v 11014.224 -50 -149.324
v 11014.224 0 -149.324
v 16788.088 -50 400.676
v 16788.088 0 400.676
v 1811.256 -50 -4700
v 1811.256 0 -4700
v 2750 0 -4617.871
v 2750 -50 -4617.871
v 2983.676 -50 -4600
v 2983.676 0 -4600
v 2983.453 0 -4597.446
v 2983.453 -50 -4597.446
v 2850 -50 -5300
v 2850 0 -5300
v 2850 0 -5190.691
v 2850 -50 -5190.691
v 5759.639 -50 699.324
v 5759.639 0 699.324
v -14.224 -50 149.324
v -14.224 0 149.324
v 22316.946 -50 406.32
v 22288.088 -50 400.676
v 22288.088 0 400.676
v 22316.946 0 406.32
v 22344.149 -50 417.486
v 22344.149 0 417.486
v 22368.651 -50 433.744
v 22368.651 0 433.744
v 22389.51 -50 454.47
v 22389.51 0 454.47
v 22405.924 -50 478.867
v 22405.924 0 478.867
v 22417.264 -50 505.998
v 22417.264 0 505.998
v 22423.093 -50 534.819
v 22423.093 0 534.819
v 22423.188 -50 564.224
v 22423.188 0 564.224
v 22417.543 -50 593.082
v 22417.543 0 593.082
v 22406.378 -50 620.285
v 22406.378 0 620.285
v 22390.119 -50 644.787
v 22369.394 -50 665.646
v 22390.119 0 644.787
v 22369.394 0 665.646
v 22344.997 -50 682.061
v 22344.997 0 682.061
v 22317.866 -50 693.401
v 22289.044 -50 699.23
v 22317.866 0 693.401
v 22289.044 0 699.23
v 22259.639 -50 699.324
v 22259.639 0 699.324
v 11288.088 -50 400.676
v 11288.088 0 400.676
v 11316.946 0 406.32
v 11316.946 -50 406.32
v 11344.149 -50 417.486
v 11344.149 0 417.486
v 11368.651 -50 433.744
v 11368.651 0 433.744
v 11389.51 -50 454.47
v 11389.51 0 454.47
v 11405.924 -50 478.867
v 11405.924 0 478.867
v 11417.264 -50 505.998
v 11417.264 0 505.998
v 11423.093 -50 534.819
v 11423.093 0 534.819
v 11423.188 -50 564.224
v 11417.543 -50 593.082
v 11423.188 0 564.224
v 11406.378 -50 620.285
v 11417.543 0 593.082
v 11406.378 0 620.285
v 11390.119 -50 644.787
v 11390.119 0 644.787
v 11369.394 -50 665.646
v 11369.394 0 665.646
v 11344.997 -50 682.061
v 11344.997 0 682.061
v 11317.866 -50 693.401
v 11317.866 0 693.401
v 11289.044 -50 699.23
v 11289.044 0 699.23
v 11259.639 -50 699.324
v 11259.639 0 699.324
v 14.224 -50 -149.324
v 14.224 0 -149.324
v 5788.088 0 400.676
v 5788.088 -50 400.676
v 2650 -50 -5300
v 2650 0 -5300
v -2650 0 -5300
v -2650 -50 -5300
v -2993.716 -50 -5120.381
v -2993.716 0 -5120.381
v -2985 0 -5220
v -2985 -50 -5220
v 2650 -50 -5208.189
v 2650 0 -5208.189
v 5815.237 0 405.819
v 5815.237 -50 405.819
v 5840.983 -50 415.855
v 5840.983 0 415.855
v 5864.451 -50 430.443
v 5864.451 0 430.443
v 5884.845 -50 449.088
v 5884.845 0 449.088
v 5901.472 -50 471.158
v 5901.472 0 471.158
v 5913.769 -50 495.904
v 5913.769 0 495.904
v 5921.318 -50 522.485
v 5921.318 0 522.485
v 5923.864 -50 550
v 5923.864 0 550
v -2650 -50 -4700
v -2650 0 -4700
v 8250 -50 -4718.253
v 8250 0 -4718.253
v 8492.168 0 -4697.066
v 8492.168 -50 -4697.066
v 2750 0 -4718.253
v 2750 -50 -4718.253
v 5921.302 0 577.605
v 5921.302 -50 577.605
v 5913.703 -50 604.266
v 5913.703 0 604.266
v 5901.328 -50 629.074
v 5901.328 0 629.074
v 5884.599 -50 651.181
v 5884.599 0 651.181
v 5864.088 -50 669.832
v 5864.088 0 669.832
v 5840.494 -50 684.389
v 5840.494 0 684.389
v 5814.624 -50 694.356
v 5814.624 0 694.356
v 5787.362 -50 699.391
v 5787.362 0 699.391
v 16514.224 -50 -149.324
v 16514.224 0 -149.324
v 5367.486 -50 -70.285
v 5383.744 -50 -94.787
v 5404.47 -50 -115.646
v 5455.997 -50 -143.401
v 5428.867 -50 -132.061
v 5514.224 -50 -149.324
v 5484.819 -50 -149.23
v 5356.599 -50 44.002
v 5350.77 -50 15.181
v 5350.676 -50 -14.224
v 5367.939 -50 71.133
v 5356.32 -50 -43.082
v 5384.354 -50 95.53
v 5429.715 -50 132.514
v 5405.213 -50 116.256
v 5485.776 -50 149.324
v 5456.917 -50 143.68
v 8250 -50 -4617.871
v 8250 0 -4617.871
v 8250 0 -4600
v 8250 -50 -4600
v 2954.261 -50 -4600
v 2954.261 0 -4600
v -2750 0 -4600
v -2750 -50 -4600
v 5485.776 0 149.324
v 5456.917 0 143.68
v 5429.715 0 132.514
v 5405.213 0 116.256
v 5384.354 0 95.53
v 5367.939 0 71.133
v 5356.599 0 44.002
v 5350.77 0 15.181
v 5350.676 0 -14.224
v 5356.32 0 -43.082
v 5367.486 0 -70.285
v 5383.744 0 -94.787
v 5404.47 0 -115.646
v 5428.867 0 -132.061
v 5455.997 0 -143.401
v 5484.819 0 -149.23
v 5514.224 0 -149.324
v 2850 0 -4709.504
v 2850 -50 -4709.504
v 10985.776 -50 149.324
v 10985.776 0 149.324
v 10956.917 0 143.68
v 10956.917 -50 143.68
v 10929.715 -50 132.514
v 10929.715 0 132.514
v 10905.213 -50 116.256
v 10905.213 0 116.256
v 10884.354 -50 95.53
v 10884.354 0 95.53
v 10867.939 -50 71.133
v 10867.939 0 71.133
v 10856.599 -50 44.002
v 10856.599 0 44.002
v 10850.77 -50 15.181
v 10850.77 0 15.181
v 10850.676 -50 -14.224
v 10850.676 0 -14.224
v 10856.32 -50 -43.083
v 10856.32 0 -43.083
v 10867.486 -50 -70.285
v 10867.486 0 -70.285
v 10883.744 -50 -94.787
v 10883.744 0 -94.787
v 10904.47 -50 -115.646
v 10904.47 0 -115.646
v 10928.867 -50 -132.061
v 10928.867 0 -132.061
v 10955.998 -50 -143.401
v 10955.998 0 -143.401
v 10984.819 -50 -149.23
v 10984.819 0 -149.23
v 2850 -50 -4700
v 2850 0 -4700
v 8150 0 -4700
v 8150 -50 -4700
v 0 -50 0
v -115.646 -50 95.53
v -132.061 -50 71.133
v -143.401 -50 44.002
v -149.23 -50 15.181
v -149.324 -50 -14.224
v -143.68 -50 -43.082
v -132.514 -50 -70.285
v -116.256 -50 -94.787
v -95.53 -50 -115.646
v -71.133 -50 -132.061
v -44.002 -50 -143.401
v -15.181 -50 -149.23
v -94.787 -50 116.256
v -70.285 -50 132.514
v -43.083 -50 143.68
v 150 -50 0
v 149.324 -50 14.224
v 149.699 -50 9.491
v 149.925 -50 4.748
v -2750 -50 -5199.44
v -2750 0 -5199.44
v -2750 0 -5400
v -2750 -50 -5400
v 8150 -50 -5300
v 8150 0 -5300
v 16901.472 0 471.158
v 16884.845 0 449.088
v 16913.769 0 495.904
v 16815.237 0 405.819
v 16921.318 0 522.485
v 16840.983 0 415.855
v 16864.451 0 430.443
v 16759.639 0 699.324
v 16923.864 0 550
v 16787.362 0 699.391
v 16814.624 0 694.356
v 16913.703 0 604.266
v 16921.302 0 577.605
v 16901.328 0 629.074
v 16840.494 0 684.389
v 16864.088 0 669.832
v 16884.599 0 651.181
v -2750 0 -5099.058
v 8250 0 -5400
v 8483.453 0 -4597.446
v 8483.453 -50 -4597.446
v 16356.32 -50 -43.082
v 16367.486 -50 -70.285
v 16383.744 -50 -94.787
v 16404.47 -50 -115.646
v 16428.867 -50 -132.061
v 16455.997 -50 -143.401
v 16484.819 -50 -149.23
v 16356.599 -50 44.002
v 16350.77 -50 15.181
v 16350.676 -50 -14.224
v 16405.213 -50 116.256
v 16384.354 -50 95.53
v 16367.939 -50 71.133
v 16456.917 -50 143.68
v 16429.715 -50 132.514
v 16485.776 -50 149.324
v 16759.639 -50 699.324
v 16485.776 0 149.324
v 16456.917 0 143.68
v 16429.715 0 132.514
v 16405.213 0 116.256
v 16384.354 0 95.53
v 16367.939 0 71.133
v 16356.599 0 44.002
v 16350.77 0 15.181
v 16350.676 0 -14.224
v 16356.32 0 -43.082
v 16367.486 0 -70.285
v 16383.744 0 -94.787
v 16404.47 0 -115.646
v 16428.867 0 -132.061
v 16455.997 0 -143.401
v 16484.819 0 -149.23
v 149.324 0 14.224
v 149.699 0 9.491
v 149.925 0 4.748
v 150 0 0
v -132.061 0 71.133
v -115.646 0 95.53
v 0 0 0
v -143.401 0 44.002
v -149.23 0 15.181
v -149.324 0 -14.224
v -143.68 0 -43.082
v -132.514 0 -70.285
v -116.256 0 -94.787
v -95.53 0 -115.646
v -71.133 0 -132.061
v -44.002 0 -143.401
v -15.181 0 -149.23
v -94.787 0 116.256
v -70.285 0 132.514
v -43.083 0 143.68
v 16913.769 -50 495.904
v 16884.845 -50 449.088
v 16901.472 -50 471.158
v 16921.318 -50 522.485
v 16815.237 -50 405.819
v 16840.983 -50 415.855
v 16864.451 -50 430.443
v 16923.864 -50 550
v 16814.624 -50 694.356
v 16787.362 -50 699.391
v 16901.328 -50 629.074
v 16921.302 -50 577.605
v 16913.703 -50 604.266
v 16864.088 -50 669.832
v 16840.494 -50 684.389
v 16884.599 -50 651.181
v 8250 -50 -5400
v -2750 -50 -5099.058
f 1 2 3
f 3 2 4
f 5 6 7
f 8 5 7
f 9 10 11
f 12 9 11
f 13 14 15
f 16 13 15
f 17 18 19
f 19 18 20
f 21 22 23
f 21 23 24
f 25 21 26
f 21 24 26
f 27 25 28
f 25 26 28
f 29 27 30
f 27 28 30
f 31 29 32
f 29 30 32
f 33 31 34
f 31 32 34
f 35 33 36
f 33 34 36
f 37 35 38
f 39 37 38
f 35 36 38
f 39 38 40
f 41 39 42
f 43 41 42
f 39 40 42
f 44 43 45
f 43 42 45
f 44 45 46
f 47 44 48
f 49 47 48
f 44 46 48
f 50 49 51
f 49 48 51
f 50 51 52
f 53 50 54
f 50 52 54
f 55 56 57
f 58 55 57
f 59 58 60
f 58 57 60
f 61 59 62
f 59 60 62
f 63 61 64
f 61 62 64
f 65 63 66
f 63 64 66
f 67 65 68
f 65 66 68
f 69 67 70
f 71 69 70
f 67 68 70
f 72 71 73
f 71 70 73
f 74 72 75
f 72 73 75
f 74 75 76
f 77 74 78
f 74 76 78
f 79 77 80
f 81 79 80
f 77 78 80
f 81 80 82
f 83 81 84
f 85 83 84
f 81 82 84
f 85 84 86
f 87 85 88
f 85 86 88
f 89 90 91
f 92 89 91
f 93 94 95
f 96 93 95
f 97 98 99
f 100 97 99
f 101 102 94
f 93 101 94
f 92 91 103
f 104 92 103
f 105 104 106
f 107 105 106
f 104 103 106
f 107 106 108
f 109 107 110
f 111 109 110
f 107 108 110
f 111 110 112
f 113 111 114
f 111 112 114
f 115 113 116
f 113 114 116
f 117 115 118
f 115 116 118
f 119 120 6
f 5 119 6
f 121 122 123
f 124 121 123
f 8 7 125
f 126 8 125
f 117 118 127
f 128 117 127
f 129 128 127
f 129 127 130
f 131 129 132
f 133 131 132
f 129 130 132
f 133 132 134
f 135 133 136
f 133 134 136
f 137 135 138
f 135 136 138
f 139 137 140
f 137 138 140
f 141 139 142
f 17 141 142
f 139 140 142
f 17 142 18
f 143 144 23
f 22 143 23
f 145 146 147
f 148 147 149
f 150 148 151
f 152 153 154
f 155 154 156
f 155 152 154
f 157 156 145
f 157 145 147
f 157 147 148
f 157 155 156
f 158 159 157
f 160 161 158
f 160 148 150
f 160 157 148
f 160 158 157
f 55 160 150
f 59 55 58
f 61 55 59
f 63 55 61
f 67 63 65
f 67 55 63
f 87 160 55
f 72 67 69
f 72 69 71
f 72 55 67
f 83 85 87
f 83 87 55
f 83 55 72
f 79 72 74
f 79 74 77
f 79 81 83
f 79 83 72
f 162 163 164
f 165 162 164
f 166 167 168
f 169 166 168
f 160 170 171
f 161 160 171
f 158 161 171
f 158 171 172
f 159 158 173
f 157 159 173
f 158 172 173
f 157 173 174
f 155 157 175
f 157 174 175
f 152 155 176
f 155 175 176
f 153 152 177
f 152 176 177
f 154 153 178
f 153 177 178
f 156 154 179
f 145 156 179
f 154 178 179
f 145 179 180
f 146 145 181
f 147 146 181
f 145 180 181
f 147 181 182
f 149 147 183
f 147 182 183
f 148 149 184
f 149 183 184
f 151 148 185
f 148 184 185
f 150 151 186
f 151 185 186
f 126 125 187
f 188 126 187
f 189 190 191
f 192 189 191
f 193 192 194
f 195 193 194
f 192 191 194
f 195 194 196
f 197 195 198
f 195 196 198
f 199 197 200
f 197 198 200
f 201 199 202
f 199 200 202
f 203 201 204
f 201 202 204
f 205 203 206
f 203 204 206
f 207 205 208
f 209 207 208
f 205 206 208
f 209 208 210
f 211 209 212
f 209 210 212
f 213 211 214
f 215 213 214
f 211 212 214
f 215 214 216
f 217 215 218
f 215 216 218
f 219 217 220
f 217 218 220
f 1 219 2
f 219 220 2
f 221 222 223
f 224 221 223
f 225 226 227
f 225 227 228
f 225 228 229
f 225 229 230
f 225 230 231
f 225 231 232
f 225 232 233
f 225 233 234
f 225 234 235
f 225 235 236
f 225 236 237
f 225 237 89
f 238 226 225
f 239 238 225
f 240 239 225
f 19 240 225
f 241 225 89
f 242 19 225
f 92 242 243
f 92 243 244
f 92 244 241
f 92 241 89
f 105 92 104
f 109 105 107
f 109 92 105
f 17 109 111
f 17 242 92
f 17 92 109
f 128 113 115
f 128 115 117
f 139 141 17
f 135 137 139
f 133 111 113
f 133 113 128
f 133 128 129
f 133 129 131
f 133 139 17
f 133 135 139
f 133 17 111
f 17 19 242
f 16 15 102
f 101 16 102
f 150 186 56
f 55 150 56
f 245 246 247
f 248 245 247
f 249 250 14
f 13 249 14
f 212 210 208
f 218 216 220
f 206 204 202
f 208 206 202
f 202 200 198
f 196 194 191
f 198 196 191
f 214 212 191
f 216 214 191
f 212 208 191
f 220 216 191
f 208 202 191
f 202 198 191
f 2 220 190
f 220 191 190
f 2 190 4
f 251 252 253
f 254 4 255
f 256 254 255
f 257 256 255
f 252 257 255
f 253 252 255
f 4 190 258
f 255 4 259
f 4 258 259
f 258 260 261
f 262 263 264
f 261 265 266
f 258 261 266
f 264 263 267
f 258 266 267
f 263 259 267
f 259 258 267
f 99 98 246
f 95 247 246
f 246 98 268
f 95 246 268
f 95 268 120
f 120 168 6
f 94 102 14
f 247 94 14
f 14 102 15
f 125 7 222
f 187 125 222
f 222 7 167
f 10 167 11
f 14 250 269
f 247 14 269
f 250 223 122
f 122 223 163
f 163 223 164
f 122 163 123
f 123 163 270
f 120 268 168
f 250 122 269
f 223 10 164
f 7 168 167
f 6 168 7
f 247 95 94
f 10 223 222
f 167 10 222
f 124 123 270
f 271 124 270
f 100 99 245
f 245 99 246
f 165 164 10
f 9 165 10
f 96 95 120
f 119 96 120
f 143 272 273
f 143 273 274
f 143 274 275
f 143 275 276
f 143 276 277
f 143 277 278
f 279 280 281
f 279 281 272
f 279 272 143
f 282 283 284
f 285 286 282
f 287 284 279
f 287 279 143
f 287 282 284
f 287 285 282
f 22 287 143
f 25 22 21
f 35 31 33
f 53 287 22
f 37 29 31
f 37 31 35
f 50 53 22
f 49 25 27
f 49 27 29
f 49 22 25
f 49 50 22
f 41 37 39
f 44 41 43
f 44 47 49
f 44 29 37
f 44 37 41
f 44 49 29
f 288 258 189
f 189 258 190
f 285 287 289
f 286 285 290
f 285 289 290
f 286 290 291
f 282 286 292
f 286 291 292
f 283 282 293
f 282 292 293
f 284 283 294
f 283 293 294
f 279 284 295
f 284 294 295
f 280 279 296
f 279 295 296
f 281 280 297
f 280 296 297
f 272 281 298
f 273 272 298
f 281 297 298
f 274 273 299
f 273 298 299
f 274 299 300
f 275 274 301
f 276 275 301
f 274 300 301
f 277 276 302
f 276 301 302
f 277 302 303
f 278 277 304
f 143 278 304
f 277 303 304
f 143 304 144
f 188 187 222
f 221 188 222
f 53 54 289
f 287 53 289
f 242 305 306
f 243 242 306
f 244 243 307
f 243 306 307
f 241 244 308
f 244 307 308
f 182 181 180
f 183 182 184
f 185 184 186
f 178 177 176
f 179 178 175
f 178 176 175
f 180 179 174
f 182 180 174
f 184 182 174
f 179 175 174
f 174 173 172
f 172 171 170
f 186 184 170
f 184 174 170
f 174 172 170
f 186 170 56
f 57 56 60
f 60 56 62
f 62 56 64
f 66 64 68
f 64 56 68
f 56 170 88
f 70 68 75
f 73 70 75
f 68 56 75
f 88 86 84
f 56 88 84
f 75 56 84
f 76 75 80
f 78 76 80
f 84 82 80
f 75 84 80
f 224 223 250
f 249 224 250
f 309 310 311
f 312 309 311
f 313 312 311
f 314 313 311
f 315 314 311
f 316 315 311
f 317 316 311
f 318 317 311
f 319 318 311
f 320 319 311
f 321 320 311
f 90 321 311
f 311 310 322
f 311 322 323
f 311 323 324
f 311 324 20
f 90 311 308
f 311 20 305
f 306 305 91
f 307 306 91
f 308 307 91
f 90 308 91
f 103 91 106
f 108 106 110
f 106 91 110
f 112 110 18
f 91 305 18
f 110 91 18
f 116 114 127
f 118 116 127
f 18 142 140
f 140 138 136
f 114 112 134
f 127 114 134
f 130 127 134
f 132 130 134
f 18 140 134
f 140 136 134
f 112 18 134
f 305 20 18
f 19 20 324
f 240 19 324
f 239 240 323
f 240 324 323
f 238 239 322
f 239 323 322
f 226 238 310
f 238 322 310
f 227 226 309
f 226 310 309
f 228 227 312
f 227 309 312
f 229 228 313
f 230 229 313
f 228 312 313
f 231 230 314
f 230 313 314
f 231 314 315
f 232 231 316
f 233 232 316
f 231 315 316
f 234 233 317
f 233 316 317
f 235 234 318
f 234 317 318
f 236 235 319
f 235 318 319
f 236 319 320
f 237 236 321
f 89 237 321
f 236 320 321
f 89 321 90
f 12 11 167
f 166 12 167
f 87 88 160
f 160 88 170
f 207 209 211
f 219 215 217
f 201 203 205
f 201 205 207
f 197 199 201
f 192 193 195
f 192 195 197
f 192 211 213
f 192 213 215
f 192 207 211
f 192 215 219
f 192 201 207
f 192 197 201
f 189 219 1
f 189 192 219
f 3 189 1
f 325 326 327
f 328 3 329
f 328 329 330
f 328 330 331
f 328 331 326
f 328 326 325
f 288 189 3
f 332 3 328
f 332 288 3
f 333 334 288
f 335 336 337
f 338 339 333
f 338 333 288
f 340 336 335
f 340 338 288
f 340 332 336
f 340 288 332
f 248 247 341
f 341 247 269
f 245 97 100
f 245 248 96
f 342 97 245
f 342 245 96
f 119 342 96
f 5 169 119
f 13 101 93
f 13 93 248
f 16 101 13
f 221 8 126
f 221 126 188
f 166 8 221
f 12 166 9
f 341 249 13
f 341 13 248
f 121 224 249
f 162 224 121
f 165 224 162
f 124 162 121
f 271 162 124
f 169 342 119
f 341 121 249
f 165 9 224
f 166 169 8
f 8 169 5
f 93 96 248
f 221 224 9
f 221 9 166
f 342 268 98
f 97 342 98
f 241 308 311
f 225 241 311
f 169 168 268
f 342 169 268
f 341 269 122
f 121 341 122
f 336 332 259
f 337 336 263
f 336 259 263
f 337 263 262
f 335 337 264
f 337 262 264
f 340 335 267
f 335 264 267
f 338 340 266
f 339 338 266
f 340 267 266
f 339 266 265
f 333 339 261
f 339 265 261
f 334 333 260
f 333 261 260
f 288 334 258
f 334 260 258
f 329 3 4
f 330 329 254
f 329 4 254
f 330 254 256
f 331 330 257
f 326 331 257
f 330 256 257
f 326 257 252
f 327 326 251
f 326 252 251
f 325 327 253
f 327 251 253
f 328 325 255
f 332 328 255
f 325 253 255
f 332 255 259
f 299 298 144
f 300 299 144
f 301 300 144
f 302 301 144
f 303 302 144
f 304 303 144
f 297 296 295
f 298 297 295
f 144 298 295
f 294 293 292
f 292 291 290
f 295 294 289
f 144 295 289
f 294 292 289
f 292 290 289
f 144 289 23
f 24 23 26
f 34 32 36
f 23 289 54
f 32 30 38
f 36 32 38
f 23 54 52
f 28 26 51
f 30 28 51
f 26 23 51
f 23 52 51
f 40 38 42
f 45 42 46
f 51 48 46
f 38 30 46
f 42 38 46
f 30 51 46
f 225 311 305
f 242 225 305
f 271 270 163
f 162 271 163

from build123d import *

# Parameters (mm, degrees)
F1_DEPTH = 50


# Not quite as in the source:
# - ends of sketch curves that miss each other by under 0.0002 mm in the source are joined


with BuildPart() as f1:
    # F0 (on Front) → F1 (new body)
    with BuildSketch(Plane.XZ):
        with BuildLine():
            Line((-3.5807e-05, -3.4109e-06), (-14.224173738, 149.3240532582))
            ThreePointArc((-14.224173738, 149.3240532582), (-149.3240566691, -14.224137931), (14.224102124, -149.32406008))
            Line((14.224102124, -149.32406008), (-3.5807e-05, -3.4109e-06))
        make_face()
        with BuildLine():
            Line((5759.6393866078, 699.3240566691), (-14.224173738, 149.3240532582))
            ThreePointArc((-14.224173738, 149.3240532582), (95.5300548118, 115.6460489063), (149.3240566691, 14.224137931))
            Line((149.3240566691, 14.224137931), (5624.5394678697, 535.775862069))
            ThreePointArc((5624.5394678697, 535.775862069), (5658.2174870863, 645.5300686774), (5759.6393866078, 699.3240566691))
        make_face()
        with BuildLine():
            ThreePointArc((149.3240566691, 14.224137931), (95.5300548118, 115.6460489063), (-14.224173738, 149.3240532582))
            Line((-14.224173738, 149.3240532582), (-3.5807e-05, -3.4109e-06))
            Line((-3.5807e-05, -3.4109e-06), (149.3240566691, 14.224137931))
        make_face()
        with BuildLine():
            Line((-3.5807e-05, -3.4109e-06), (14.224102124, -149.32406008))
            ThreePointArc((14.224102124, -149.32406008), (110.9811139758, -100.9118047639), (150, 0))
            Line((150, 0), (-3.5807e-05, -3.4109e-06))
        make_face()
        with BuildLine():
            ThreePointArc((150, 0), (110.9811139758, -100.9118047639), (14.224102124, -149.32406008))
            Line((14.224102124, -149.32406008), (1581.818181818, 0))
            Line((1581.818181818, 0), (150, 0))
        make_face()
        with BuildLine():
            Line((5624.5394678697, 535.775862069), (149.3240566691, 14.224137931))
            ThreePointArc((149.3240566691, 14.224137931), (149.8309188725, 7.1200947899), (150, 0))
            Line((150, 0), (1581.818181818, 0))
            Line((1581.818181818, 0), (5788.0876624699, 400.6759433309))
            ThreePointArc((5788.0876624699, 400.6759433309), (5678.3334558614, 434.3539625474), (5624.5394678697, 535.775862069))
        make_face()
        with BuildLine():
            Line((5773.8635245388, 550), (5759.6393866078, 699.3240566691))
            ThreePointArc((5759.6393866078, 699.3240566691), (5658.2174870863, 645.5300686774), (5624.5394678697, 535.775862069))
            Line((5624.5394678697, 535.775862069), (5773.8635245388, 550))
        make_face()
        with BuildLine():
            ThreePointArc((5923.8635245388, 550), (5874.7753159964, 660.9811260748), (5759.6393866078, 699.3240566691))
            Line((5759.6393866078, 699.3240566691), (5773.8635245388, 550))
            Line((5773.8635245388, 550), (5788.0876624699, 400.6759433309))
            ThreePointArc((5788.0876624699, 400.6759433309), (5884.8446506136, 449.0882085424), (5923.8635245388, 550))
        make_face()
        with BuildLine():
            Line((5773.8635245388, 550), (5624.5394678697, 535.775862069))
            ThreePointArc((5624.5394678697, 535.775862069), (5678.3334558614, 434.3539625474), (5788.0876624699, 400.6759433309))
            Line((5788.0876624699, 400.6759433309), (5773.8635245388, 550))
        make_face()
    extrude(amount=F1_DEPTH)


with BuildPart() as f1b:
    # F0 (on Front) → F1, piece 2 (new body)
    with BuildSketch(Plane.XZ):
        with BuildLine():
            ThreePointArc((5485.7757801252, 149.3240488634), (5389.0188462368, 100.9117610063), (5350, 0))
            Line((5350, 0), (5650, 0))
            ThreePointArc((5650, 0), (5600.9117610063, 110.9811537632), (5485.7757801252, 149.3240488634))
        make_face()
        with BuildLine():
            Line((5650, 0), (5350, 0))
            ThreePointArc((5350, 0), (5399.0881771331, -110.9810975152), (5514.224053409, -149.3240647204))
            ThreePointArc((5514.224053409, -149.3240647204), (5610.9810975152, -100.9118228669), (5650, 0))
        make_face()
        with BuildLine():
            Line((11259.6394721102, 699.3240648138), (5485.7757801252, 149.3240488634))
            ThreePointArc((5485.7757801252, 149.3240488634), (5600.9117610063, 110.9811537632), (5650, 0))
            ThreePointArc((5650, 0), (5610.9810975152, -100.9118228669), (5514.224053409, -149.3240647204))
            Line((5514.224053409, -149.3240647204), (11288.087745394, 400.67595123))
            ThreePointArc((11288.087745394, 400.67595123), (11124.5394677469, 535.7758633581), (11259.6394721102, 699.3240648138))
        make_face()
        with BuildLine():
            ThreePointArc((11423.8635245388, 550), (11374.7753477701, 660.9810971839), (11259.6394721102, 699.3240648138))
            ThreePointArc((11259.6394721102, 699.3240648138), (11124.5394677469, 535.7758633581), (11288.087745394, 400.67595123))
            ThreePointArc((11288.087745394, 400.67595123), (11384.8446786333, 449.088239358), (11423.8635245388, 550))
        make_face()
    extrude(amount=F1_DEPTH)


with BuildPart() as f1c:
    # F0 (on Front) → F1, piece 3 (new body)
    with BuildSketch(Plane.XZ):
        with BuildLine():
            ThreePointArc((11014.224137931, -149.3240566691), (11110.9811260748, -100.9117914576), (11150, 0))
            ThreePointArc((11150, 0), (11100.9117914575, 110.9811260748), (10985.775862069, 149.3240566691))
            Line((10985.775862069, 149.3240566691), (11014.224137931, -149.3240566691))
        make_face()
        with BuildLine():
            ThreePointArc((10985.775862069, 149.3240566691), (11100.9117914575, 110.9811260748), (11150, 0))
            ThreePointArc((11150, 0), (11110.9811260748, -100.9117914576), (11014.224137931, -149.3240566691))
            Line((11014.224137931, -149.3240566691), (16788.0876624699, 400.6759433309))
            ThreePointArc((16788.0876624699, 400.6759433309), (16624.5394678697, 535.775862069), (16759.6393866078, 699.3240566691))
            Line((16759.6393866078, 699.3240566691), (10985.775862069, 149.3240566691))
        make_face()
        with BuildLine():
            Line((11014.224137931, -149.3240566691), (10985.775862069, 149.3240566691))
            ThreePointArc((10985.775862069, 149.3240566691), (10850.6759433309, -14.224137931), (11014.224137931, -149.3240566691))
        make_face()
        with BuildLine():
            Line((16788.0876624699, 400.6759433309), (16759.6393866078, 699.3240566691))
            ThreePointArc((16759.6393866078, 699.3240566691), (16624.5394678697, 535.775862069), (16788.0876624699, 400.6759433309))
        make_face()
        with BuildLine():
            ThreePointArc((16923.8635245388, 550), (16874.7753159964, 660.9811260748), (16759.6393866078, 699.3240566691))
            Line((16759.6393866078, 699.3240566691), (16788.0876624699, 400.6759433309))
            ThreePointArc((16788.0876624699, 400.6759433309), (16884.8446506136, 449.0882085424), (16923.8635245388, 550))
        make_face()
    extrude(amount=F1_DEPTH)


with BuildPart() as f1d:
    # F0 (on Front) → F1, piece 4 (new body)
    with BuildSketch(Plane.XZ):
        with BuildLine():
            ThreePointArc((16514.2240542685, -149.3240646385), (16610.9810978056, -100.9118225475), (16650, 0))
            ThreePointArc((16650, 0), (16600.9117603676, 110.9811543439), (16485.7757784065, 149.3240486997))
            ThreePointArc((16485.7757784065, 149.3240486997), (16350.6759433309, -14.224137931), (16514.2240542685, -149.3240646385))
        make_face()
        with BuildLine():
            ThreePointArc((16485.7757784065, 149.3240486997), (16600.9117603676, 110.9811543439), (16650, 0))
            ThreePointArc((16650, 0), (16610.9810978056, -100.9118225475), (16514.2240542685, -149.3240646385))
            Line((16514.2240542685, -149.3240646385), (22288.0877459291, 400.6759512809))
            ThreePointArc((22288.0877459291, 400.675951281), (22124.5394678697, 535.775862069), (22259.639470067, 699.3240646191))
            Line((22259.639470067, 699.3240646192), (16485.7757784065, 149.3240486997))
        make_face()
        with BuildLine():
            ThreePointArc((22423.8635245388, 550), (22374.7753470108, 660.9810978743), (22259.639470067, 699.3240646191))
            ThreePointArc((22259.639470067, 699.3240646191), (22124.5394678697, 535.775862069), (22288.0877459291, 400.675951281))
            ThreePointArc((22288.0877459291, 400.675951281), (22384.8446788141, 449.0882395569), (22423.8635245388, 550))
        make_face()
    extrude(amount=F1_DEPTH)


with BuildPart() as f1e:
    # F0 (on Front) → F1, piece 5 (new body)
    with BuildSketch(Plane.XZ):
        Polygon((2750, -4617.8705309245), (2750, -4600), (-2750, -4600), (-2750, -5099.0581803171), (-2650, -5090.3093139645), (-2650, -4700), (1811.2558728689, -4700), align=None)
        Polygon((2954.2611031453, -4600), (2750, -4600), (2750, -4617.8705309245), align=None)
        Polygon((2954.2611031453, -4600), (2750, -4617.8705309245), (2750, -4718.2525146788), (2850, -4709.5036483262), (2850, -4700), (2958.6271974359, -4700), (2992.1681885505, -4697.065543514), (2983.676053874, -4600), align=None)
        Polygon((2983.4526142757, -4597.4460737049), (2954.2611031453, -4600), (2983.676053874, -4600), align=None)
        Polygon((-2650, -5090.3093139645), (-2750, -5099.0581803171), (-2750, -5199.4401640714), (-2650, -5190.6912977188), align=None)
        Polygon((-2750, -5199.4401640714), (-2750, -5099.0581803171), (-2993.7155742748, -5120.3805301908), (-2985, -5220), align=None)
        Polygon((8250, -4600), (2983.676053874, -4600), (2992.1681885505, -4697.065543514), (2958.6271974359, -4700), (7311.2558728688, -4700), (8250, -4617.8705309245), align=None)
        Polygon((-2650, -5190.6912977188), (-2750, -5199.4401640714), (-2750, -5400), (2750, -5400), (2750, -5199.4401640714), (2650, -5208.189030424), (2650, -5300), (-2650, -5300), align=None)
        Polygon((2850, -5190.6912977188), (2750, -5199.4401640714), (2750, -5400), (8250, -5400), (8250, -4718.2525146788), (8150, -4727.0013810314), (8150, -5300), (2850, -5300), align=None)
        Polygon((8483.4526142757, -4597.4460737049), (8250, -4617.8705309245), (8250, -4718.2525146788), (8492.1681885505, -4697.065543514), align=None)
        Polygon((8250, -4718.2525146788), (8250, -4617.8705309245), (7311.2558728688, -4700), (8150, -4700), (8150, -4727.0013810314), align=None)
    extrude(amount=F1_DEPTH)


solid = Compound([f1.part, f1b.part, f1c.part, f1d.part, f1e.part])
